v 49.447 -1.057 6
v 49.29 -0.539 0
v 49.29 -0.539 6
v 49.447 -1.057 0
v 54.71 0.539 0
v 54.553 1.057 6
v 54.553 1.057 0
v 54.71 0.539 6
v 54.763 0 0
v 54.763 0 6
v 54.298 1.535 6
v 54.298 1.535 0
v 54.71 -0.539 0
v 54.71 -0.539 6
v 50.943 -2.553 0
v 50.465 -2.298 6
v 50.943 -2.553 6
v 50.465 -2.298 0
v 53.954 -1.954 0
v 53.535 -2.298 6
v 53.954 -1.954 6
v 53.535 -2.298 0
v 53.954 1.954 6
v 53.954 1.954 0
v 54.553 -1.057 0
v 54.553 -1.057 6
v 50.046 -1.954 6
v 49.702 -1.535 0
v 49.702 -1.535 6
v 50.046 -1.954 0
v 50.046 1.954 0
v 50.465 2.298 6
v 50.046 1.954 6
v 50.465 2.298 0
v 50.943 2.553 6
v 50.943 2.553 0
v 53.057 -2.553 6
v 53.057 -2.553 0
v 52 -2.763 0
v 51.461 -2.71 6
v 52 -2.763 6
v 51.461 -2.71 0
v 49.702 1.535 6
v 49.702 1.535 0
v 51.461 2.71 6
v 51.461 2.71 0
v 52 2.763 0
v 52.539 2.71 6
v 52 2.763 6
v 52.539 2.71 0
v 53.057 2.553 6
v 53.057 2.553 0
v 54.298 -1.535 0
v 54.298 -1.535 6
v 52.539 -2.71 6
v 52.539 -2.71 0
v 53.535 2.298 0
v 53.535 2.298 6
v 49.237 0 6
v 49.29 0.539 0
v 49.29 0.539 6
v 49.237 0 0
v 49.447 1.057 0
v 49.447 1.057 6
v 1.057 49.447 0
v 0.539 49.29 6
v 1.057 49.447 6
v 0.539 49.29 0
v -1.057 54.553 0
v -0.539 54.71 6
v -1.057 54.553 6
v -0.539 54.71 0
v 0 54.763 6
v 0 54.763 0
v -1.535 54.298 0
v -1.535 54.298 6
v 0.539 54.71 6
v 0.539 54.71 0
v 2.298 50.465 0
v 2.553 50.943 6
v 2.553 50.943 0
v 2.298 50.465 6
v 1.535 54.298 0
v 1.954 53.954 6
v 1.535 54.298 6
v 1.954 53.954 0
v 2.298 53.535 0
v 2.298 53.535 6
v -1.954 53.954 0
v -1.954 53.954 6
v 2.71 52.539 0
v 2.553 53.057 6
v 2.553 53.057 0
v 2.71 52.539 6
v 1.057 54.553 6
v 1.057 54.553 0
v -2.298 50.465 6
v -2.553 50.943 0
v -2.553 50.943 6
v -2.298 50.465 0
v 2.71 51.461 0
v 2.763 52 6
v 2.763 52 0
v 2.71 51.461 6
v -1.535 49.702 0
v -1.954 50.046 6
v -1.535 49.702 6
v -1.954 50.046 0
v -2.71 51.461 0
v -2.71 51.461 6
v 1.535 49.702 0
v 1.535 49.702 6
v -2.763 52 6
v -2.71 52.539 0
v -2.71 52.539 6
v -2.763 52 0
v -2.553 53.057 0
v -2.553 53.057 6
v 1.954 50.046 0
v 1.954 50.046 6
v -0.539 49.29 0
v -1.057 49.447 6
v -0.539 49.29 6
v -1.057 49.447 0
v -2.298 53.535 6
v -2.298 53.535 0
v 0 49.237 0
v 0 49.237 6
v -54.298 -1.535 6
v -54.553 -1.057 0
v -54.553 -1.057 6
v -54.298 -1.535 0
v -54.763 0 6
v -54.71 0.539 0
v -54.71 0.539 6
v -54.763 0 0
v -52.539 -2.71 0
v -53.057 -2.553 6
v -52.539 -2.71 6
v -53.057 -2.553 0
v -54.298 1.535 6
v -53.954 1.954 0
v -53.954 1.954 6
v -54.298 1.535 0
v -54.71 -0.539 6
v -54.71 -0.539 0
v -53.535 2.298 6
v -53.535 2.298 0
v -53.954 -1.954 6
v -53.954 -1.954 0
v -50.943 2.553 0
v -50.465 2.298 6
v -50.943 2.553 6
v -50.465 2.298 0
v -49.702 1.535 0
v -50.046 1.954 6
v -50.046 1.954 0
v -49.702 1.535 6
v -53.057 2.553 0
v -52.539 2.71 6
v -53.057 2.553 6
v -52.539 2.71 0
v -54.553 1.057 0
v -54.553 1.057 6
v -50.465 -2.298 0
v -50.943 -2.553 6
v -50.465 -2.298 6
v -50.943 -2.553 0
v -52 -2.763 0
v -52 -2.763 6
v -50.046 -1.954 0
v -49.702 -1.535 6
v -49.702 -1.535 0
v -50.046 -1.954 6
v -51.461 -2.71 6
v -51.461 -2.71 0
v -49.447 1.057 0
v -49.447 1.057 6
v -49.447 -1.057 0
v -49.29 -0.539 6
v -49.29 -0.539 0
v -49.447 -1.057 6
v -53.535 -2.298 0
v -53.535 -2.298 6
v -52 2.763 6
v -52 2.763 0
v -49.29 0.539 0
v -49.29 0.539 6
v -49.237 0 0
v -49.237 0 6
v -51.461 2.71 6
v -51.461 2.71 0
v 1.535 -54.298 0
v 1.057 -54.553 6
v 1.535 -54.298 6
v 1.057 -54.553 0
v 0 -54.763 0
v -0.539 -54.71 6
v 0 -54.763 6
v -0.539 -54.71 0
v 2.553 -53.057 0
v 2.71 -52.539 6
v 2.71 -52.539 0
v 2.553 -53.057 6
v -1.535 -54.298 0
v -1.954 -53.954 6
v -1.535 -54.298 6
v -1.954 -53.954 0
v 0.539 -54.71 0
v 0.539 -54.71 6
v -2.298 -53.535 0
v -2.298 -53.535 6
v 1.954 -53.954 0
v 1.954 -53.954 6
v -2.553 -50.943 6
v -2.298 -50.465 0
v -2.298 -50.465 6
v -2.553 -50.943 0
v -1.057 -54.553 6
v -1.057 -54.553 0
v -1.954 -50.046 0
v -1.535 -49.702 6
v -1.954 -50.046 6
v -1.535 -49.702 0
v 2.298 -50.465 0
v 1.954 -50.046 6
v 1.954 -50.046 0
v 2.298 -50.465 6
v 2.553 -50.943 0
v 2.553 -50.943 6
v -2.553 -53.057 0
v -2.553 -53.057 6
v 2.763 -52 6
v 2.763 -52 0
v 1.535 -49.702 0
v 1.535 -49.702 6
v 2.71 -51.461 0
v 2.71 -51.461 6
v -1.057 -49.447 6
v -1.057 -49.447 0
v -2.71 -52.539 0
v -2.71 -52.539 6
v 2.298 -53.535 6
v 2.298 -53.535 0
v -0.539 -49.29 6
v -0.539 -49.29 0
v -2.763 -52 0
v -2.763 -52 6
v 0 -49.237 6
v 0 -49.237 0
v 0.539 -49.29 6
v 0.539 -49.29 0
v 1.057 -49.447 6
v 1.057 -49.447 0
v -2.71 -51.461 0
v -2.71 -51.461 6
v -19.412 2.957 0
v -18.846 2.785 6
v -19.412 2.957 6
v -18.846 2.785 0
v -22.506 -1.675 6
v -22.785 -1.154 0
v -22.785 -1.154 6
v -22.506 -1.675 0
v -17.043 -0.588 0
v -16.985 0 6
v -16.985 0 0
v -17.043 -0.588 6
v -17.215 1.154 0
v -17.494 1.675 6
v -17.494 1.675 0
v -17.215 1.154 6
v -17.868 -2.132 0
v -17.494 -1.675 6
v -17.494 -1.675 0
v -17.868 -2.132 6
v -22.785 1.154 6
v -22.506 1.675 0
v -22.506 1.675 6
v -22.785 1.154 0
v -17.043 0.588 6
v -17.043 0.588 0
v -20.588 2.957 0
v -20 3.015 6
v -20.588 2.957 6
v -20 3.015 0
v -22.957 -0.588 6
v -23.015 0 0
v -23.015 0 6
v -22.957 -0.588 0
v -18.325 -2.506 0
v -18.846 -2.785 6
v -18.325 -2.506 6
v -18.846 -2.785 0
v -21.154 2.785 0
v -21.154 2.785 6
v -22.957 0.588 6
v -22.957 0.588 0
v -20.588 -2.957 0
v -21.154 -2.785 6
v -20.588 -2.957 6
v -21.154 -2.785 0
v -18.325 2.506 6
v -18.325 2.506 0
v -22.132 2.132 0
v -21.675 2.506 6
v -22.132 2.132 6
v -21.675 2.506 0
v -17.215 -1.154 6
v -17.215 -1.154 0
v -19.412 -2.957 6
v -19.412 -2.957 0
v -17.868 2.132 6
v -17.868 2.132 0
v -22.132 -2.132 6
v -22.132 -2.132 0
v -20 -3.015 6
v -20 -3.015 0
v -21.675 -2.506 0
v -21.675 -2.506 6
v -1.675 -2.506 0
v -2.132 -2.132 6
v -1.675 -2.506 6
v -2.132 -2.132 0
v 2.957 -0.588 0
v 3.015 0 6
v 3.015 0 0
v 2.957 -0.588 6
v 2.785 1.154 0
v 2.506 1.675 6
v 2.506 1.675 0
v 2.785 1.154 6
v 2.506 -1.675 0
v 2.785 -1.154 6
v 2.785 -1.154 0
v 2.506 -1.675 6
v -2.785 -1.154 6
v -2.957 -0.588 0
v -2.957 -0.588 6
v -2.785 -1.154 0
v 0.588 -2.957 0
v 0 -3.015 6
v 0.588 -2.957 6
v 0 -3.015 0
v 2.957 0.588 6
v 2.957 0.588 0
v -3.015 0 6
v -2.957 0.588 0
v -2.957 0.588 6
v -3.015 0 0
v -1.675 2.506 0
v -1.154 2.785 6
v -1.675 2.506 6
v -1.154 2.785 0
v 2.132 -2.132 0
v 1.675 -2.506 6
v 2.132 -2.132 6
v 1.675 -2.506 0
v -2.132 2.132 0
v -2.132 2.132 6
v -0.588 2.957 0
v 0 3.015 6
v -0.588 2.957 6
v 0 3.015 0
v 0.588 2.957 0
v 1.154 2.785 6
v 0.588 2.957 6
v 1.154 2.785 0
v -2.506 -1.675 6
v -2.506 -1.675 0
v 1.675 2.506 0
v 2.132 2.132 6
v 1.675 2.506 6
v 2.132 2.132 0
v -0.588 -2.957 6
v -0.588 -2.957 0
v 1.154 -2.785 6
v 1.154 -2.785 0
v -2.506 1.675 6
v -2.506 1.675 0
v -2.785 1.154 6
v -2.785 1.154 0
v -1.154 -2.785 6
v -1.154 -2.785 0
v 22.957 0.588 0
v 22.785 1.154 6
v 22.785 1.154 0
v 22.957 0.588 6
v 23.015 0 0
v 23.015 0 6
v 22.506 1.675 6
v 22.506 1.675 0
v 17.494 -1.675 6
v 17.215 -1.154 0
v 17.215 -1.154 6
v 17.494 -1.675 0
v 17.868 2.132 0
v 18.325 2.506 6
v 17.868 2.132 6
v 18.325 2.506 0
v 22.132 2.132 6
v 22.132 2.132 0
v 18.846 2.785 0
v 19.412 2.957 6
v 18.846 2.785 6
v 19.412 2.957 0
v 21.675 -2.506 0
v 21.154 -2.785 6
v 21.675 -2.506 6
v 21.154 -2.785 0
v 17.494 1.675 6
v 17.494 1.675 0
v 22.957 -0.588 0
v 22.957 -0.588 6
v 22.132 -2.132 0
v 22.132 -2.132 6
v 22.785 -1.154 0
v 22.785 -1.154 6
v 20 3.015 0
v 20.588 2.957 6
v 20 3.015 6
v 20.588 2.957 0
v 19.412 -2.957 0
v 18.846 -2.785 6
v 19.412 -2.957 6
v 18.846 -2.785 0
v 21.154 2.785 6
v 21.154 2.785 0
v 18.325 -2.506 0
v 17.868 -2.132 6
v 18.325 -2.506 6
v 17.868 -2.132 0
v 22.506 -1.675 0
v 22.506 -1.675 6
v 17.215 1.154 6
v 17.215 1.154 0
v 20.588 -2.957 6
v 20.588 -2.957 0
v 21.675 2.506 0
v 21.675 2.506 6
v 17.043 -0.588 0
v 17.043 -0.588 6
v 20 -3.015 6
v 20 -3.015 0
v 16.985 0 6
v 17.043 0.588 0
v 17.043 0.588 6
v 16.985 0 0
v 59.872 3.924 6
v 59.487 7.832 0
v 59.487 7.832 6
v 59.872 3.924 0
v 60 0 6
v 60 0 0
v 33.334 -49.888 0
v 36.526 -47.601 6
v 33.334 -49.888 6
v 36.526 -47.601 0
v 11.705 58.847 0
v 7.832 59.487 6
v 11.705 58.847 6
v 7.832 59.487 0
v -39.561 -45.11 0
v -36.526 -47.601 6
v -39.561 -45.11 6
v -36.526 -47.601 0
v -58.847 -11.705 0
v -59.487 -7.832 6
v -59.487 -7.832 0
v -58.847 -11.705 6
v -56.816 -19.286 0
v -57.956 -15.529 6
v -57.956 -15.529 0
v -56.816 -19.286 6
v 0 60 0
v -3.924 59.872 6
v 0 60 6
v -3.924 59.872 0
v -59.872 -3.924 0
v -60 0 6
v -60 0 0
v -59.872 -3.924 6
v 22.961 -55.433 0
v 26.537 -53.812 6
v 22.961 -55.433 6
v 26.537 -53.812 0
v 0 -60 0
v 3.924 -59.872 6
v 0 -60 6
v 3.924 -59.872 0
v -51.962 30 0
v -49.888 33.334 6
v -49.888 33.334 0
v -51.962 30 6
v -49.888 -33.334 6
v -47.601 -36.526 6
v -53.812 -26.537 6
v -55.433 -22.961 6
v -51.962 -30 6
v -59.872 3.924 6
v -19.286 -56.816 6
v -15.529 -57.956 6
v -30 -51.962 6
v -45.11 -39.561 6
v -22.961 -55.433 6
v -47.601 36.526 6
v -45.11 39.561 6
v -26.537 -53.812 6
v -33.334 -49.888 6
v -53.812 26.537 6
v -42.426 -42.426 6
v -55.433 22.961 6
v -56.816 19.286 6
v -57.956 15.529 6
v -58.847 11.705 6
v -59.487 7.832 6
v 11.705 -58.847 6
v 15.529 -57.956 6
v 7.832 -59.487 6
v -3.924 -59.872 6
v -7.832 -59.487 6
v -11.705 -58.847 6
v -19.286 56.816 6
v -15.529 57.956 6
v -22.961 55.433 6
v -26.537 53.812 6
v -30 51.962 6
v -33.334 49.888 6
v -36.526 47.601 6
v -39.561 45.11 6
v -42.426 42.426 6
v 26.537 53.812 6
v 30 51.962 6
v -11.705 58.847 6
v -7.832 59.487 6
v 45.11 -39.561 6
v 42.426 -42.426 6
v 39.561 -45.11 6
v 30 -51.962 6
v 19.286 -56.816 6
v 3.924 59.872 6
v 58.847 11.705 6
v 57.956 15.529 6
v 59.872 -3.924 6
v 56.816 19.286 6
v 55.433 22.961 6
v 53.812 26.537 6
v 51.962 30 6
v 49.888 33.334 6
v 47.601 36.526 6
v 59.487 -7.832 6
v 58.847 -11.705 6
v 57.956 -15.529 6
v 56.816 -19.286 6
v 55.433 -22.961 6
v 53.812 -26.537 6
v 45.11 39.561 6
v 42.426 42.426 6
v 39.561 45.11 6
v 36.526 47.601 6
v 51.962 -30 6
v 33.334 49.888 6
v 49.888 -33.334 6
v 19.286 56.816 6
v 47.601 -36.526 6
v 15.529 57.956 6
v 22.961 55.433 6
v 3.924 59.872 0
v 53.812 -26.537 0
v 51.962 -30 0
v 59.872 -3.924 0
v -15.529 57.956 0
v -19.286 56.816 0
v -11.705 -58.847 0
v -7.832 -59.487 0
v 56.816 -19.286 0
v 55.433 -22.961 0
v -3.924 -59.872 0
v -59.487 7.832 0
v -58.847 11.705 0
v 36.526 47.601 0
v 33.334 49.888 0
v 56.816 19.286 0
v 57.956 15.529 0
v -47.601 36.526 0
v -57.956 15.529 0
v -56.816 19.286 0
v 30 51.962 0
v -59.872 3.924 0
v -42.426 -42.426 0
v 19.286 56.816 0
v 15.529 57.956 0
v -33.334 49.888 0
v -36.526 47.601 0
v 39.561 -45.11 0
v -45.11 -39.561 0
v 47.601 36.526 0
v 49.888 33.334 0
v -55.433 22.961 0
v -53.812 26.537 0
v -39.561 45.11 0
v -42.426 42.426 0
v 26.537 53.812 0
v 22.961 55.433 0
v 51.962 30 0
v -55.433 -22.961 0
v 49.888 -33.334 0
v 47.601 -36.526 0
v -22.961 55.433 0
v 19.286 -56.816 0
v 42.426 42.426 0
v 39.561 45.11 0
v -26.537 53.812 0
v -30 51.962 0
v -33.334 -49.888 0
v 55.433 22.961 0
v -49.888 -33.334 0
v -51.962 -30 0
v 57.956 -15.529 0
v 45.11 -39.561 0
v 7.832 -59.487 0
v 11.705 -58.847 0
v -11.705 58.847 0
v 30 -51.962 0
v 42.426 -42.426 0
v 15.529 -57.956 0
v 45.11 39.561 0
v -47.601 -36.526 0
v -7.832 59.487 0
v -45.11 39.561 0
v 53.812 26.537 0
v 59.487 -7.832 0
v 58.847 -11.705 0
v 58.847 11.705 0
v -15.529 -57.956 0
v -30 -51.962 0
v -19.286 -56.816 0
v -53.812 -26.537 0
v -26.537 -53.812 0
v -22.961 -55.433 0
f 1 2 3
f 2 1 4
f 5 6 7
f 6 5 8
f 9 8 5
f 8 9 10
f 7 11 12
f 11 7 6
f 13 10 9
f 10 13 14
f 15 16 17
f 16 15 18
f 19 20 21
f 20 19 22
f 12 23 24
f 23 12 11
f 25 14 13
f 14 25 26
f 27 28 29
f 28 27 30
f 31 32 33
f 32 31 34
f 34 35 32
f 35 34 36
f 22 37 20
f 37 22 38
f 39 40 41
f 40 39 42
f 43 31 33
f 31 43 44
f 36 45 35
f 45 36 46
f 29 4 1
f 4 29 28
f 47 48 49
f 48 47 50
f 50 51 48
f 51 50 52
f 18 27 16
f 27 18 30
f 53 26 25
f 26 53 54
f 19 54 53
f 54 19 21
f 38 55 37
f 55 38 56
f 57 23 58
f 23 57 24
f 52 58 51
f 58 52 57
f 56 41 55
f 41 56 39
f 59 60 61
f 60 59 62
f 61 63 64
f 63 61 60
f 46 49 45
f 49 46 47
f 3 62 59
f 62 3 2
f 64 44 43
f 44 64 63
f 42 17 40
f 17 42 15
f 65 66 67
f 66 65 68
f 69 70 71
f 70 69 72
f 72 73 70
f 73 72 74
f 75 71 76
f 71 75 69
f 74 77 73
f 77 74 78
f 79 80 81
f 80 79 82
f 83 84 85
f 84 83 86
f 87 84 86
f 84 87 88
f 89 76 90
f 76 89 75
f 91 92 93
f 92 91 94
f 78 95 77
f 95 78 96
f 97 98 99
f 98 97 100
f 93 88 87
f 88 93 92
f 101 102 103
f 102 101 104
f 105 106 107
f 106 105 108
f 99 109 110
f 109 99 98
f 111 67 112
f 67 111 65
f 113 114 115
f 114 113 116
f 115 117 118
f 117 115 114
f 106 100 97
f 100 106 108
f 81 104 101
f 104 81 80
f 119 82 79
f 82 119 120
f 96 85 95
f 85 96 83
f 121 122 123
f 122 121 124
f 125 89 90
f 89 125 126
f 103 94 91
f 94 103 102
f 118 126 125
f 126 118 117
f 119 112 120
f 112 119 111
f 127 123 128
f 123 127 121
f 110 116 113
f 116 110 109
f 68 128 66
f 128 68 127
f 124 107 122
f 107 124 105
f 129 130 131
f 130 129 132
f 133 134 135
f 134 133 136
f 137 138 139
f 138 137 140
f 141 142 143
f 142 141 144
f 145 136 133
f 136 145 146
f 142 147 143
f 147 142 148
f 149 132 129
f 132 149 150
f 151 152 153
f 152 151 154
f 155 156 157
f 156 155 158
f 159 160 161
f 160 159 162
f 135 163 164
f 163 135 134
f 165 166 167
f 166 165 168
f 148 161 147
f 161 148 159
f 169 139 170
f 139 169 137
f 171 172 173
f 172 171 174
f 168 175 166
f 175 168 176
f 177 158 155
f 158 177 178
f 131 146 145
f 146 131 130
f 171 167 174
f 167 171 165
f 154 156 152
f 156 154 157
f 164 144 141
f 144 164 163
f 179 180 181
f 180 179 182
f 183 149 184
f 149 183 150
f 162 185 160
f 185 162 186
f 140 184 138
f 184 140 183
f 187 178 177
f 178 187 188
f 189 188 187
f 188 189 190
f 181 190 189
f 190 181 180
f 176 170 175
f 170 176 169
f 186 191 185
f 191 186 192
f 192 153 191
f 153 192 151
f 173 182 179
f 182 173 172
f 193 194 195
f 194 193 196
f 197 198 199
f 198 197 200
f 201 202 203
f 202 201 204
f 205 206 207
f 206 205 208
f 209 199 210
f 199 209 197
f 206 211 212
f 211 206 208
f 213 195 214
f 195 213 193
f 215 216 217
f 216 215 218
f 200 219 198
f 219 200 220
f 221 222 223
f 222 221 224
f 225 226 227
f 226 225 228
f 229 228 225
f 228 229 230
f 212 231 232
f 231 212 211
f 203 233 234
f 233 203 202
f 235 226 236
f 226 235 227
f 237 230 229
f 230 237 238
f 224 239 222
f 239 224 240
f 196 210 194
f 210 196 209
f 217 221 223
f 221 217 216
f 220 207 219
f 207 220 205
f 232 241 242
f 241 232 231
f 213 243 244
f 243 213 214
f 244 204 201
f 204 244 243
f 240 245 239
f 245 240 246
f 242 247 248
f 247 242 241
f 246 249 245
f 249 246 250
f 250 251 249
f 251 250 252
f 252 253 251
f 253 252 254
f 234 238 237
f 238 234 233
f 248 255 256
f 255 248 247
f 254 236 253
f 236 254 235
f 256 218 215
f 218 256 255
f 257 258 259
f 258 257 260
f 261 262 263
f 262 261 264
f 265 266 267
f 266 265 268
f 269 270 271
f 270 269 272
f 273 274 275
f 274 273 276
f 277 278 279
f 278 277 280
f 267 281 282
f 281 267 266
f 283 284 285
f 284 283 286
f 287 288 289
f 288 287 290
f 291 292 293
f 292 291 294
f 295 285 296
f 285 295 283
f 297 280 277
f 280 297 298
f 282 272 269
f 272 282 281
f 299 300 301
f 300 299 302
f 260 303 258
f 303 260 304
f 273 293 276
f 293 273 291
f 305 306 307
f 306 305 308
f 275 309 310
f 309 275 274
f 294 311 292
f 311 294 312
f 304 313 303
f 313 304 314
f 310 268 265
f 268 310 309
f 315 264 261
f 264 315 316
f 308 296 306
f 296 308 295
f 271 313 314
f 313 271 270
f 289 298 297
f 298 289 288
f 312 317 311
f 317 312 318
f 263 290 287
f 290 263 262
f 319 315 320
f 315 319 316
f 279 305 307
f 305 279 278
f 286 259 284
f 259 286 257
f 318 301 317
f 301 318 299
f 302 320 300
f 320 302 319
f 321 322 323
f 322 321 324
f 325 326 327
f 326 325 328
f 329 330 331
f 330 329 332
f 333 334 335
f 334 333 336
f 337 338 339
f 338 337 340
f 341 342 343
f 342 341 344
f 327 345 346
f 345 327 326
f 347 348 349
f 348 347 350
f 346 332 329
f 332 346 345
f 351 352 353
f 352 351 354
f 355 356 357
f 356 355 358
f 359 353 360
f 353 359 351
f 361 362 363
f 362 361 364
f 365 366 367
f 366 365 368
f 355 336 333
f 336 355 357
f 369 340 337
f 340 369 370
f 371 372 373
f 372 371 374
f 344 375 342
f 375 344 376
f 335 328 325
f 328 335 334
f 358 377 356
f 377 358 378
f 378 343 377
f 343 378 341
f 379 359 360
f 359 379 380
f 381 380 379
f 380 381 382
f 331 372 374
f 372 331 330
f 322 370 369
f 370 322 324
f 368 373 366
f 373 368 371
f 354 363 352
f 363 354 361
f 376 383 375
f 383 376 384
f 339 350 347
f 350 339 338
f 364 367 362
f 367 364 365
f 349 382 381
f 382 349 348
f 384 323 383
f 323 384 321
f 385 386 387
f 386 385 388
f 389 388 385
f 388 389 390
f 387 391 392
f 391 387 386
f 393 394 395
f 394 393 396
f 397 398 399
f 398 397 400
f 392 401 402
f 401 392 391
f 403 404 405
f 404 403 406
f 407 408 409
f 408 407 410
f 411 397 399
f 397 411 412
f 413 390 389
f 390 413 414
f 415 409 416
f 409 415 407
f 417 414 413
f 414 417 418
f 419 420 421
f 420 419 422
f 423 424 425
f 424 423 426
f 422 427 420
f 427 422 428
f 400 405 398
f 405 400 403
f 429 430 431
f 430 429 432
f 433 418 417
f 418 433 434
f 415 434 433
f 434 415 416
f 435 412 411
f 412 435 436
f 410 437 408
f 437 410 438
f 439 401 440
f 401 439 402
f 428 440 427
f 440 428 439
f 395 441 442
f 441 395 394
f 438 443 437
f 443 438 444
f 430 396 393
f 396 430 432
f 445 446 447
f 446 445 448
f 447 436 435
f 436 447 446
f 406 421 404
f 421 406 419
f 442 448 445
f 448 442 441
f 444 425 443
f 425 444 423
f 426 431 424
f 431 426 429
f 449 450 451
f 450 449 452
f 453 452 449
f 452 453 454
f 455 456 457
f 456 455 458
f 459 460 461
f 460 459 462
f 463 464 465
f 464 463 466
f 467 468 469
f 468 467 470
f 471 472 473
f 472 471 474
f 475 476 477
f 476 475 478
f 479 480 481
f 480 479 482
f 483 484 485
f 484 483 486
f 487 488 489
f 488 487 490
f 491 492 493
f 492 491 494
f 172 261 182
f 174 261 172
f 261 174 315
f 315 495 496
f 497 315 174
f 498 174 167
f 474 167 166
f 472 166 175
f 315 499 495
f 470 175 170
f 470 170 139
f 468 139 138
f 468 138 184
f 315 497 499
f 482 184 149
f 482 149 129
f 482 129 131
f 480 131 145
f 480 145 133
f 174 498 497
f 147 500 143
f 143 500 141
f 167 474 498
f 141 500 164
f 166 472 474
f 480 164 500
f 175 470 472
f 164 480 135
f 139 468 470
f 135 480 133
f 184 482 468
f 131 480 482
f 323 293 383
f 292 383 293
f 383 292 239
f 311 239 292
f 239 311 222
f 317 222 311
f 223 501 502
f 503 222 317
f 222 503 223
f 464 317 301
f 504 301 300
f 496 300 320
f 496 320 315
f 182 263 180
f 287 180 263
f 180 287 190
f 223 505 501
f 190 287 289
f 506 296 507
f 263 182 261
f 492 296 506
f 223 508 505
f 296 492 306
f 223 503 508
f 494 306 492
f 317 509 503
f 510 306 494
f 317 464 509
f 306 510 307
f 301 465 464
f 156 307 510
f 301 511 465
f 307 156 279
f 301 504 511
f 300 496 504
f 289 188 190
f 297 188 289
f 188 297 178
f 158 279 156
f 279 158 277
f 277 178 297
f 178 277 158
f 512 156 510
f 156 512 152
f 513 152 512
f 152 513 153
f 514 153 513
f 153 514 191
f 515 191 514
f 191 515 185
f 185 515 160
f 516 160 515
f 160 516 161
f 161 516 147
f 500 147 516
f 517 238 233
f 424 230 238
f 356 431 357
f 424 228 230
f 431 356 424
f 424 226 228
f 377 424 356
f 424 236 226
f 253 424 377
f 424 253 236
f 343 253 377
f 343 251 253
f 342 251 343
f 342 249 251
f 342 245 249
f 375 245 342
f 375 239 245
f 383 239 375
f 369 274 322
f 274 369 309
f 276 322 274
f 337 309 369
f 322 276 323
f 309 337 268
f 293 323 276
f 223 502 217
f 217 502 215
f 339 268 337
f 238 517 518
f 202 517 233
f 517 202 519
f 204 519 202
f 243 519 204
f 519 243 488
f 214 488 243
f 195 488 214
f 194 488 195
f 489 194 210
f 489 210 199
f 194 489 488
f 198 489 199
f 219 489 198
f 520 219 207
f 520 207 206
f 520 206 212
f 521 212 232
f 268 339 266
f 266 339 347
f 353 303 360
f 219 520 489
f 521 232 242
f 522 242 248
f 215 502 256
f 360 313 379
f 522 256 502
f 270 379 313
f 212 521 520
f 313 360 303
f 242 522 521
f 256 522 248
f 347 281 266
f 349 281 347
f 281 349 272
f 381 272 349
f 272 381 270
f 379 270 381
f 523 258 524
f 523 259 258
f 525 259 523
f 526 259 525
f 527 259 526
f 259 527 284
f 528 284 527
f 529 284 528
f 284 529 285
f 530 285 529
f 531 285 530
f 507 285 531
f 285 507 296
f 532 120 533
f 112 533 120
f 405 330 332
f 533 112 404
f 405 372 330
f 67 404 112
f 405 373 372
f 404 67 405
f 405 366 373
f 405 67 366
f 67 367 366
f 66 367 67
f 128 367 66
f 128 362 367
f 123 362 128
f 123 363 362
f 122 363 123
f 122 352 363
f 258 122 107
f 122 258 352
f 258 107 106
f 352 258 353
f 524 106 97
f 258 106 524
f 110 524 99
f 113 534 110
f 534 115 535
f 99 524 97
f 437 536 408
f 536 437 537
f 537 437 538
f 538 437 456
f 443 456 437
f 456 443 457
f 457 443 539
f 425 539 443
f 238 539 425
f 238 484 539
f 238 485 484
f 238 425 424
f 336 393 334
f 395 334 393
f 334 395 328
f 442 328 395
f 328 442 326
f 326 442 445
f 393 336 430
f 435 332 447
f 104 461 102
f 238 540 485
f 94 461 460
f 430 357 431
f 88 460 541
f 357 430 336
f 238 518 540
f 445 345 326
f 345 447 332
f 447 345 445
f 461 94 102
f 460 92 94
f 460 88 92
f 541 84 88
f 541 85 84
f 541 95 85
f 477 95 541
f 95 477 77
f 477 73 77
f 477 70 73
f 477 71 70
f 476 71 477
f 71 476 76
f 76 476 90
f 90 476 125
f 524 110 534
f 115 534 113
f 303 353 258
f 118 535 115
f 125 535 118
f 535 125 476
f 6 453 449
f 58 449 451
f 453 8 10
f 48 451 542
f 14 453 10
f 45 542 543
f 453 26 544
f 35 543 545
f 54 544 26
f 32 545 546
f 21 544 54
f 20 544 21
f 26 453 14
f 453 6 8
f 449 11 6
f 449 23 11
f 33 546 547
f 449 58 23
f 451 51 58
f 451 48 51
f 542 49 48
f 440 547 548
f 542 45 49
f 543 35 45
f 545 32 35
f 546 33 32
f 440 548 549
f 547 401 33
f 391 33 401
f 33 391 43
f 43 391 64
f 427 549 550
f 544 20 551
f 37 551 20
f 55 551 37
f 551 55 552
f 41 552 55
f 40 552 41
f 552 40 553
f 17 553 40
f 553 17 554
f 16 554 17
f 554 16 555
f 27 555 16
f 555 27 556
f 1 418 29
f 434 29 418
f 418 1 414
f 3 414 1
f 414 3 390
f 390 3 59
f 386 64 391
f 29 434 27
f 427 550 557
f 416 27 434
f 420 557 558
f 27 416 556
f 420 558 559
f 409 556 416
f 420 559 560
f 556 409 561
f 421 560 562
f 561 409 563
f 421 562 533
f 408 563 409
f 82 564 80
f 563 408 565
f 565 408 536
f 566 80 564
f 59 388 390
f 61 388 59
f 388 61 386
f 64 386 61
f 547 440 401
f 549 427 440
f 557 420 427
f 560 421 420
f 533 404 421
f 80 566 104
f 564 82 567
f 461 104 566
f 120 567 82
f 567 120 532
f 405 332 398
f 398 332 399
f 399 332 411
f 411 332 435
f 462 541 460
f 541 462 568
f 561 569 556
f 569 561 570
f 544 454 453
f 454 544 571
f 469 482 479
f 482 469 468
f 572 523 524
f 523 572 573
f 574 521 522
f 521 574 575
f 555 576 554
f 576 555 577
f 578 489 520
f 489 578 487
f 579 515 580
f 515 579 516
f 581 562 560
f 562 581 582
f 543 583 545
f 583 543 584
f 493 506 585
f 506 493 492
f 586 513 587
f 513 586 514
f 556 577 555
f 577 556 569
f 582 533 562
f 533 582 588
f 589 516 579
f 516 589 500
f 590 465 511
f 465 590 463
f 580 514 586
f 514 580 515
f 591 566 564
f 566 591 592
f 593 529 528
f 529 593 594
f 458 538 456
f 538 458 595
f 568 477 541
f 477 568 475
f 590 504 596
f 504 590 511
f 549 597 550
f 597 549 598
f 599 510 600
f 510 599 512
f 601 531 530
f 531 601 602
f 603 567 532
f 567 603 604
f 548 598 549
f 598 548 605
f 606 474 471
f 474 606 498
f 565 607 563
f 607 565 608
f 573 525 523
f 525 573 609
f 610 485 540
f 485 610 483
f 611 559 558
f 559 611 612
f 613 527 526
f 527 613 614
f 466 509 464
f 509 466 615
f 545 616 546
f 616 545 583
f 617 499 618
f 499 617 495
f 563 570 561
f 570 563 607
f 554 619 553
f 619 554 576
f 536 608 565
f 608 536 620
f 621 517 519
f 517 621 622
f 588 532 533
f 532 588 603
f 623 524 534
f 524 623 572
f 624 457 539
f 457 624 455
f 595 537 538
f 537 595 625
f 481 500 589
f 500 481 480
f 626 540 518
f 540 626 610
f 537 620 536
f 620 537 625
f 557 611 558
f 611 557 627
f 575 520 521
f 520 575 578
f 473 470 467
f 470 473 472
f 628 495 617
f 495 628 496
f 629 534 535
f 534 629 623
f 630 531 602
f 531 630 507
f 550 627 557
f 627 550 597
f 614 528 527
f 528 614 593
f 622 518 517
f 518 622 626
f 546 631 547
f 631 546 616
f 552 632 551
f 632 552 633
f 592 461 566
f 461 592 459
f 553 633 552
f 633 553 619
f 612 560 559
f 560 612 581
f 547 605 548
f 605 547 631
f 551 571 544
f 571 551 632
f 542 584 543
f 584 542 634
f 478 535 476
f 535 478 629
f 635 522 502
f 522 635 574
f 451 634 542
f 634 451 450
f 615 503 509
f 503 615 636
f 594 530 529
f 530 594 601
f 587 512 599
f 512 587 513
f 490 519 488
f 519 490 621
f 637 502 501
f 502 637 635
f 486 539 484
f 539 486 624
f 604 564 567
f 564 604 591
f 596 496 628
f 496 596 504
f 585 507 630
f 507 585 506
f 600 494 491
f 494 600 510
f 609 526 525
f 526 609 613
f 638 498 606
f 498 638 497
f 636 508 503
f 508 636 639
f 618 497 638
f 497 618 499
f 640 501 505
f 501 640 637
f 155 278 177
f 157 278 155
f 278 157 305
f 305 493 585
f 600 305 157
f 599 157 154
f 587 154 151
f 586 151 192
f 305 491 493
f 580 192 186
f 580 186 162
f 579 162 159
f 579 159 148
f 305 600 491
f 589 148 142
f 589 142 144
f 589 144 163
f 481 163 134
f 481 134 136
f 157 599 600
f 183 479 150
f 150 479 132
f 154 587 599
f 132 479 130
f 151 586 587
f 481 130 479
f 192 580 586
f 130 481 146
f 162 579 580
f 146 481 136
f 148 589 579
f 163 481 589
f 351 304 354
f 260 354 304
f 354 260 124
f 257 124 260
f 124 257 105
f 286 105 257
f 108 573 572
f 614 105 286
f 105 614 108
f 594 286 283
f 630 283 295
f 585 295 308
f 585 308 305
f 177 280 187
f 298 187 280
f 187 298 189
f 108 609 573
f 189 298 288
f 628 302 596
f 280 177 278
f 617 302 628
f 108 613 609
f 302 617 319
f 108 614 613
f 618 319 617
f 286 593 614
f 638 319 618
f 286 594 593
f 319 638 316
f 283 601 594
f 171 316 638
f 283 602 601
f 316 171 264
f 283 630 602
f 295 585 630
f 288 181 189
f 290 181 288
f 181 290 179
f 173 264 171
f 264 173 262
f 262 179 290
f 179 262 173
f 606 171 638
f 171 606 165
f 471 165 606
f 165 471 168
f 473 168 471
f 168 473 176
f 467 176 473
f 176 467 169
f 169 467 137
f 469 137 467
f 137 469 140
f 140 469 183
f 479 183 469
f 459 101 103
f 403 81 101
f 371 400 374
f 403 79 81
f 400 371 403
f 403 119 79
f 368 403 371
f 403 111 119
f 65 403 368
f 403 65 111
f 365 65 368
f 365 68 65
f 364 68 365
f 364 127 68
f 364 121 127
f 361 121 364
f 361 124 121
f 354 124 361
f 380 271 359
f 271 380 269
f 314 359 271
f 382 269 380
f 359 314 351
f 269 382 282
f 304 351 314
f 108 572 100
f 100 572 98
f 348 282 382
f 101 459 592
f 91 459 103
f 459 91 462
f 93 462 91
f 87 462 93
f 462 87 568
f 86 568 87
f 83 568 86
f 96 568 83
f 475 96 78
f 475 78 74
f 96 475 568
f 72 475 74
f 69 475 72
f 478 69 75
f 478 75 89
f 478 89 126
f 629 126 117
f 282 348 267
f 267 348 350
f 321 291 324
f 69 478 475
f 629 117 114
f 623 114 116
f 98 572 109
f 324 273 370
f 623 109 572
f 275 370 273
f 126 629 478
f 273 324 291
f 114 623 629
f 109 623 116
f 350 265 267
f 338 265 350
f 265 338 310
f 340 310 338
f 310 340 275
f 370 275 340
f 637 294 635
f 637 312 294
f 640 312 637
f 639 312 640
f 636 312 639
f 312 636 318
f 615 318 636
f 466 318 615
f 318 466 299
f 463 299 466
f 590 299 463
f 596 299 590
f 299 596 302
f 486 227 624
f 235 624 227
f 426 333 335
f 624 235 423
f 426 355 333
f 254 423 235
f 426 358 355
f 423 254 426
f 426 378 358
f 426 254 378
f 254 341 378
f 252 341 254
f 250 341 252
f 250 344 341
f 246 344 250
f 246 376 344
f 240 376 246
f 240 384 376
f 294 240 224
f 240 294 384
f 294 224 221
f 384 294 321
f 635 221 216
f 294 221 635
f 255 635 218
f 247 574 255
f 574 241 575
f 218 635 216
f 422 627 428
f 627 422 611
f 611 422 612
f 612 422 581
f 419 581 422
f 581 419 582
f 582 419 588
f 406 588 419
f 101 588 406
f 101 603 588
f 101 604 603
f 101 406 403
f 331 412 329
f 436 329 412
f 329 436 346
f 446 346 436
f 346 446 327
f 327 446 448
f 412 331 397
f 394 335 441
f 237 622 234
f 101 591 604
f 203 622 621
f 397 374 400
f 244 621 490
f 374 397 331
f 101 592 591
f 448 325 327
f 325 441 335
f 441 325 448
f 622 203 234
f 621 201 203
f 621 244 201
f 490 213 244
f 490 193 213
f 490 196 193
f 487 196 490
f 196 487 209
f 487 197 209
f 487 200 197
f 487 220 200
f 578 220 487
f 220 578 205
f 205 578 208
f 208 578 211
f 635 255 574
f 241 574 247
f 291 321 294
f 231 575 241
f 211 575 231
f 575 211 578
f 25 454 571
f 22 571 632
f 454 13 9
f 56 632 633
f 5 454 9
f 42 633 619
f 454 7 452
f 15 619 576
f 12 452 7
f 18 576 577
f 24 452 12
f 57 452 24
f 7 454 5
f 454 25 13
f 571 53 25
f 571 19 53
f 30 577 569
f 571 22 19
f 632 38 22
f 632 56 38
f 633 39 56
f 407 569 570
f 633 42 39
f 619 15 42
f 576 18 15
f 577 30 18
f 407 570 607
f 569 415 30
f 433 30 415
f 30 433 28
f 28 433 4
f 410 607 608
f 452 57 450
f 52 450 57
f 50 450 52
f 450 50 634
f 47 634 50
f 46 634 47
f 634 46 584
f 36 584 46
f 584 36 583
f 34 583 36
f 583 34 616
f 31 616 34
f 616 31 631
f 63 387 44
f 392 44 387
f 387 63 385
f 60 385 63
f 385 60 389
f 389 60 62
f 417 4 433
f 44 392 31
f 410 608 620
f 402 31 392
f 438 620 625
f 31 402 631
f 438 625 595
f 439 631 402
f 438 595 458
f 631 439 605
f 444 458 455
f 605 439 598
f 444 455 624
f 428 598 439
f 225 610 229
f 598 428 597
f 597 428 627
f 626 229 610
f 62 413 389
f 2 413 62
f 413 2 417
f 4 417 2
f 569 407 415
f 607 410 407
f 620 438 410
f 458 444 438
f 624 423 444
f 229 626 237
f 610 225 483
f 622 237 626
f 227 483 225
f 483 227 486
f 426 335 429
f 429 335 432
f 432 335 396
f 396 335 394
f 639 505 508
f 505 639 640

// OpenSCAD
// file: ../../../../../scad/lib/parent_spar_bolted.scad
// Parent modular exterior v2. mm. Geometry shared by individual part wrappers.
// Metal fasteners, ballast, Takachi box and electronics are purchased items.
/* [Dimensions] */
disk_d=225; disk_t=5;
fin_h=125; fin_w=65; fin_t=4;
beam_w=32; clearance=0.5;
float_r=100; flange_r=112.5; float_bore_r=30;
float_wall=4; float_h=180; lid_t=6;
rod_r=105.5; flange_t=6;
hub_h=32; root_x=30; root_depth=14;
$fn=96; e=0.03;
assert(disk_d<=225 && 2*flange_r<=225);
assert(fin_h>=100 && fin_h<=150 && fin_w>=50 && fin_w<=80);
assert(root_x+fin_w<disk_d/2-5);
module bore(d,h) { cylinder(d=d/cos(180/32),h=h,$fn=32); }
module bore_x(d,l) { rotate([0,90,0]) bore(d,l); }
module bore_y(d,l) { rotate([-90,0,0]) bore(d,l); }
module square_bore(h) { translate([-(beam_w+clearance)/2,-(beam_w+clearance)/2,-e]) cube([beam_w+clearance,beam_w+clearance,h+2*e]); }
module rods(h,d=6.5) { for(a=[45:90:315]) rotate([0,0,a]) translate([rod_r,0,-e]) bore(d,h+2*e); }
module lid_bolts(h) { for(a=[22.5:45:359]) rotate([0,0,a]) translate([rod_r,0,-e]) bore(4.5,h+2*e); }
module hub_pin(z) { translate([-46,10,z]) bore_x(6.5,92); }
module disk() {
 difference() { cylinder(d=disk_d,h=disk_t); square_bore(disk_t);
  for(x=[-23,23],y=[-23,23]) translate([x,y,-e]) bore(5.5,disk_t+2*e);
 }
}
module fin() {
 difference() { cube([fin_w,fin_t,fin_h]);
  for(z=[10,fin_h-hub_h+10]) translate([root_depth/2,-e,z]) bore_y(5.5,fin_t+2*e);
 }
}
module hub() {
 difference() {
  union() { translate([-30,-30,0]) cube([60,60,hub_h]);
   for(a=[0:90:270]) rotate([0,0,a]) translate([28,-16,0]) cube([16,32,hub_h]);
  }
  square_bore(hub_h);
  for(a=[0:90:270]) rotate([0,0,a]) {
   translate([root_x-clearance/2,-(fin_t+clearance)/2,-e]) cube([root_depth+clearance,fin_t+clearance,hub_h+2*e]);
   translate([root_x+root_depth/2,-17,10]) bore_y(5.5,34);
  }
  for(x=[-23,23],y=[-23,23]) translate([x,y,-e]) bore(5.5,hub_h+2*e);
  hub_pin(24);
 }
}
module beam(lower=true) {
 len=lower?180:107;
 difference() { translate([-beam_w/2,-beam_w/2,0]) cube([beam_w,beam_w,len]);
  if(lower) { for(z=[24,117]) hub_pin(z); translate([-20,0,160]) bore_x(6.5,40); translate([0,0,-e]) bore(16,8); }
  else for(z=[20,87]) translate([-20,0,z]) bore_x(6.5,40);
 }
}
module coupler() {
 // One half of a screwed split coupler. Mirror Y for the second half.
 difference() { translate([-27,0.25,0]) cube([54,26.75,64]); square_bore(64);
  for(z=[12,52]) translate([-28,0,z]) bore_x(6.5,56);
  for(x=[-22,22],z=[24,40]) translate([x,-1,z]) bore_y(5.5,29);
 }
}
module float_body() {
 difference() {
  union() { cylinder(r=float_r,h=float_h);
   translate([0,0,float_h-flange_t]) cylinder(r=flange_r,h=flange_t);
   // 45-degree underside of the flange instead of a 15 mm unsupported ledge.
   translate([0,0,float_h-flange_t-(flange_r-float_r)]) cylinder(r1=float_r,r2=flange_r,h=flange_r-float_r);
  }
  translate([0,0,-e]) cylinder(r=float_bore_r,h=float_h+2*e);
  translate([0,0,float_wall]) difference() {
   cylinder(r=float_r-float_wall,h=float_h);
   cylinder(r=float_bore_r+float_wall,h=float_h+e);
  }
  // Coupling-nut clearance; nearest cavity wall remains >=3 mm thick.
  rods(float_h,13); lid_bolts(float_h);
  for(a=[22.5:45:359]) rotate([0,0,a]) translate([rod_r,0,-e]) bore(10,float_h-flange_t+e);
 }
}
module float_lid() {
 difference() {
  cylinder(r=flange_r,h=lid_t);
  translate([0,0,-e]) cylinder(r=float_bore_r,h=lid_t+2*e);
  rods(lid_t,13); lid_bolts(lid_t);
  // Continuous face seals: 2 mm cord, 2.4 wide x 1.5 deep grooves.
  for(r=[float_bore_r+float_wall/2,float_r-float_wall/2]) translate([0,0,-e]) difference() {
   cylinder(r=r+1.2,h=1.5+e); cylinder(r=r-1.2,h=1.5+2*e);
  }
 }
}
module float_end(top=true) {
 difference() {
  union() { cylinder(r=flange_r,h=8);
   if(top) translate([-30,-30,8-e]) cube([60,60,20+e]);
   else translate([-23,-23,-40]) cube([46,46,40+e]);
  }
  rods(8);
  if(top) for(x=[-20,20],y=[-20,20]) {
   translate([x,y,-e]) bore(5.5,29);
   translate([x,y,-e]) bore(11,18+e);
  }
  if(top) for(a=[22.5:45:359]) rotate([0,0,a]) translate([rod_r,0,-e]) bore(12,8+2*e);
  else { translate([0,0,-40]) square_bore(40-e);
   translate([-24,0,-20]) bore_x(6.5,48);
  }
 }
}
module ballast_body() {
 // Open upward in print orientation. In the assembly this cup is inverted.
 difference() {
  union() { cylinder(r=45,h=51); translate([0,0,45]) cylinder(r=60,h=6);
   translate([0,0,30]) cylinder(r1=45,r2=60,h=15);
  }
  translate([0,0,6]) cylinder(r=40,h=46);
  for(x=[-23,23],y=[-23,23]) translate([x,y,-e]) bore(5.5,7);
  translate([0,0,-e]) bore(8.5,7);
  for(a=[0:90:270]) rotate([0,0,a]) translate([52,0,29]) { bore(5.5,23); bore(12,16); }
 }
}
module ballast_lid() {
 difference() { cylinder(r=60,h=6);
  for(a=[0:90:270]) rotate([0,0,a]) translate([52,0,-e]) bore(5.5,7);
  // Flooded ballast compartment: drainage, no trapped air assumption.
  for(x=[-20,0,20]) translate([x,0,-e]) bore(6,7);
 }
}
module camera_bridge() {
 // Assembly frame: local top z=78; camera seat z=8. +Y faces camera front.
 difference() {
  union() {
   translate([-30,45,70]) cube([60,90,8]);
   translate([-70,125,0]) cube([140,100,8]);
   translate([-70,125,0]) cube([140,10,78]);
   for(x=[-64,56]) translate([x,0,0]) rotate([90,0,90]) linear_extrude(8)
    polygon([[135,8],[215,8],[135,70]]);
  }
  for(x=[-20,20],y=[50,90]) translate([x,y,69]) bore(5.5,10);
  for(x=[-11,11],y=[174,206]) translate([x,y,-e]) bore(5.5,10);
 }
}
module gps_bridge() {
 // Local attachment face X=0 at deck +X; top shelf z=175.
 difference() {
  union() { translate([0,-25,0]) cube([10,50,183]);
   translate([-90,-48,175]) cube([100,96,8]);
   for(y=[-17,25]) translate([0,y,0]) rotate([90,0,0]) linear_extrude(8)
    polygon([[e,155],[e,175+e],[-80,175+e]]);
  }
  for(y=[-20,20],z=[5,45]) translate([-e,y,z]) bore_x(5.5,11);
  for(y=[-34,34]) translate([-43,y,174]) bore(4.5,10);
 }
}
// Reference antenna envelope, correct mounting ears, not a printable antenna.
module gps_reference() {
 difference() {
  union() { translate([-30,-28,0]) cube([60,56,22.5]);
   translate([-10,-41,0]) cube([20,82,6]); }
  for(y=[-34,34]) translate([0,y,-e]) bore(4.5,7);
 }
}
// main file
// mm. part=print is the intended X1C orientation.
part="assembly"; // [assembly,print]
use <../../../../../scad/lib/parent_spar_bolted.scad>
if(part=="print") { ballast_lid(); } else { ballast_lid(); }
